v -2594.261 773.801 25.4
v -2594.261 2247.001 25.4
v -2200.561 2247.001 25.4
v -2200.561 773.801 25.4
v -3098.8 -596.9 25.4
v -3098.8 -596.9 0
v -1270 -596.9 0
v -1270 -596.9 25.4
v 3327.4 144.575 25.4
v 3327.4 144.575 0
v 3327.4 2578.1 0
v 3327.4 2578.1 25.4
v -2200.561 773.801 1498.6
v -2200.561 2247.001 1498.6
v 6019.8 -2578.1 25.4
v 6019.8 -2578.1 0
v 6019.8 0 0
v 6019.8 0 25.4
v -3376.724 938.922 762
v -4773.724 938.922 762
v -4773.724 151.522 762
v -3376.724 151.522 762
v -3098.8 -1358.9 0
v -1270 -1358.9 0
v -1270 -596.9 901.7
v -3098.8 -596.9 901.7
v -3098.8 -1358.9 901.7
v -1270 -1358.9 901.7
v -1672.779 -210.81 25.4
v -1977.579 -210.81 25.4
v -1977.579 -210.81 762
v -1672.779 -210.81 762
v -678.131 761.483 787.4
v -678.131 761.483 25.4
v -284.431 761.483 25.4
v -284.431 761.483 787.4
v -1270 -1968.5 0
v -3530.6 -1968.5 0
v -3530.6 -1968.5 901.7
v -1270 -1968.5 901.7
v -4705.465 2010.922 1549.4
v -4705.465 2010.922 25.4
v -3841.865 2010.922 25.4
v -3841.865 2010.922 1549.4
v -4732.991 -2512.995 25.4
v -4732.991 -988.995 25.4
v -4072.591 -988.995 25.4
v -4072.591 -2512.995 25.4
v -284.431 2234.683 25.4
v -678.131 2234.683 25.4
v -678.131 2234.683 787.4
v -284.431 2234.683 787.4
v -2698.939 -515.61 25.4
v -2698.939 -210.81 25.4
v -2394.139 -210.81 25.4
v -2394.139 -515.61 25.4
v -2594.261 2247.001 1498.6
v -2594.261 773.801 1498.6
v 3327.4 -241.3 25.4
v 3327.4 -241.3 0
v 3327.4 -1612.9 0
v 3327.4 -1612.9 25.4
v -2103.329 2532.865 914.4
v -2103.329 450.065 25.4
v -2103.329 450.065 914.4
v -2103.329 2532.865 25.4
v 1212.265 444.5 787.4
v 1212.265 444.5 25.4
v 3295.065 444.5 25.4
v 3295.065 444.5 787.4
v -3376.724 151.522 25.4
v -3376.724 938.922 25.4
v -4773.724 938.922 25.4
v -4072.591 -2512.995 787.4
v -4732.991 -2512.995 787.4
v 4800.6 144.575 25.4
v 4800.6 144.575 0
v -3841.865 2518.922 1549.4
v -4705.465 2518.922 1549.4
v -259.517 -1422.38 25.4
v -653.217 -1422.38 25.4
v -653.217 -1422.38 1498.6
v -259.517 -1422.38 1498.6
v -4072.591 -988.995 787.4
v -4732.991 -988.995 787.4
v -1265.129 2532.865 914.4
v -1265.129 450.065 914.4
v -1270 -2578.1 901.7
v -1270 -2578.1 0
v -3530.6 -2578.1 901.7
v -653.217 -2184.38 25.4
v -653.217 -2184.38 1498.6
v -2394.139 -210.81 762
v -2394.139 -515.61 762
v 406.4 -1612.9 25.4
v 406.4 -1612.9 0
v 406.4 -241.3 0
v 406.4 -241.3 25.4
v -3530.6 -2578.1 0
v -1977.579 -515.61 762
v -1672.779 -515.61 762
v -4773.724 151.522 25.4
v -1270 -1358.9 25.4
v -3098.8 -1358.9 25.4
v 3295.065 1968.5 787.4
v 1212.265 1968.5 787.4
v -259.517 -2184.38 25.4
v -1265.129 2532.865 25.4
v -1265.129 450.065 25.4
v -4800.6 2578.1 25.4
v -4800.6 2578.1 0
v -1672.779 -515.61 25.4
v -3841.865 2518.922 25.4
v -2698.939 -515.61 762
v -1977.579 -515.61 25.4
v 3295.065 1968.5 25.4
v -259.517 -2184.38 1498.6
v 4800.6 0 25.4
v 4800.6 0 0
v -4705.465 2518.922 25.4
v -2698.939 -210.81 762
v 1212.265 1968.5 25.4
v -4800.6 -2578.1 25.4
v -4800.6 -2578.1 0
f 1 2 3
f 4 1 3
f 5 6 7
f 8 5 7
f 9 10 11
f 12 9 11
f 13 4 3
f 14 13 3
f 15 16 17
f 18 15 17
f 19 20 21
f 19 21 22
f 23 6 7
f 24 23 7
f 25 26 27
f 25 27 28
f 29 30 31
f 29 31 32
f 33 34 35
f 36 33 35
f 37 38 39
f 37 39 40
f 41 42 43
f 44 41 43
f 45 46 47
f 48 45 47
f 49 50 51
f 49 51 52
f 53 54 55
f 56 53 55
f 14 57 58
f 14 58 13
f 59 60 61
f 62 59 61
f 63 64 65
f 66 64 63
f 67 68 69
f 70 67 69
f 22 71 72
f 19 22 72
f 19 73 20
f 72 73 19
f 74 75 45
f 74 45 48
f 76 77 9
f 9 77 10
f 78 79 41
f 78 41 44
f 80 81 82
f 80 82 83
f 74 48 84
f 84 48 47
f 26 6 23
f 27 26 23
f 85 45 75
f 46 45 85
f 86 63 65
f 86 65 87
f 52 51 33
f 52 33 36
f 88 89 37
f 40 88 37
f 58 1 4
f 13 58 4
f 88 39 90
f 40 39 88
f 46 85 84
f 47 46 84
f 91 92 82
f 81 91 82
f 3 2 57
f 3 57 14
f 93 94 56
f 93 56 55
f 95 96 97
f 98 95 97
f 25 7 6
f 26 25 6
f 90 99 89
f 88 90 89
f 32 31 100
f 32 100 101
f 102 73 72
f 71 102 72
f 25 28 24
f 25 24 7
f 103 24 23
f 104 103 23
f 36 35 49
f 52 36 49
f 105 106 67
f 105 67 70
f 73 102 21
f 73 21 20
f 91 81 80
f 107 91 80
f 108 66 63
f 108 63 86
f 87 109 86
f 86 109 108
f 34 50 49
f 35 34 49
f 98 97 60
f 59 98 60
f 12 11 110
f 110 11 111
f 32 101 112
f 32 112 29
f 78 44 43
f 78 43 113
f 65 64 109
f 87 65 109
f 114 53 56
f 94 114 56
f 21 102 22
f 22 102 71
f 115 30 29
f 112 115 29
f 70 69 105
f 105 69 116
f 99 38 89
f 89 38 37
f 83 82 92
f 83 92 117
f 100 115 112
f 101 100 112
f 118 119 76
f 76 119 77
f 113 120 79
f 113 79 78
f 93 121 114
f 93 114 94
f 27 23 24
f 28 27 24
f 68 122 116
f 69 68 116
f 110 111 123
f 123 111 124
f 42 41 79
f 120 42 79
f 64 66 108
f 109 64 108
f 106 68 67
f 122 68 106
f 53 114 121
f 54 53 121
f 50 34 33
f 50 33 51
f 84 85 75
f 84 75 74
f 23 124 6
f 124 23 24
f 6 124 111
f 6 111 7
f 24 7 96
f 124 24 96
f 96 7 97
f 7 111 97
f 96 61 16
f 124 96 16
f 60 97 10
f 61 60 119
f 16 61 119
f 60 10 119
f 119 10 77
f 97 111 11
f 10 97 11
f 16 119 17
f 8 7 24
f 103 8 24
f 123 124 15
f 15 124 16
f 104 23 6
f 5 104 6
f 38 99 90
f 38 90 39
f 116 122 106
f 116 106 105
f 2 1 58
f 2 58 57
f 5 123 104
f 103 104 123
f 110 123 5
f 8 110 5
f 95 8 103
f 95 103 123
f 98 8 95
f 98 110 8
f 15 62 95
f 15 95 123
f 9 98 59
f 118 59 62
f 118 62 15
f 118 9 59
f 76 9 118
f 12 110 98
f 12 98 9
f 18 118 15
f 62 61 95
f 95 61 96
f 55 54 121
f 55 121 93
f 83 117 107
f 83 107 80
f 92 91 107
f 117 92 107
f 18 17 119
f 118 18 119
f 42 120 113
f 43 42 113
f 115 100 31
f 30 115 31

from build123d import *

# Parameters (mm, degrees)
F2_DEPTH  = 901.7
F0_W      = 2260.6
F0_H      = 609.6
F0_W_2    = 609.6
F0_H_2    = 2438.4
F4_DEPTH  = 25.4
F7_W      = 838.2
F7_H      = 2082.8
F8_DEPTH  = 889
F9_W      = 393.7
F9_H      = 1473.2
F10_DEPTH = 762
F11_W     = 863.6
F11_H     = 508
F12_DEPTH = 1524
F13_W     = 1397
F13_H     = 787.4
F14_DEPTH = 736.6
F15_W     = 393.7
F15_H     = 762
F16_DEPTH = 1473.2
F17_W     = 393.7
F17_H     = 1473.2
F18_DEPTH = 1473.2
F19_W     = 304.8
F19_H     = 304.8
F20_DEPTH = 736.6
F21_W     = 660.4
F21_H     = 1524
F22_DEPTH = 762
F23_W     = 2082.8
F23_H     = 1524
F24_DEPTH = 762


# Not quite as in the source:
# - the program builds the solid bodies; features that only make, move or delete a surface that nothing else refers to are left out


with BuildPart() as f2:
    # F0 (on Top) → F2 (new body)
    with BuildSketch(Plane.XY):
        Polygon((-1270, -1358.9), (-1270, -952.5), (-1270, -596.9), (-3098.8, -596.9), (-3098.8, -1358.9), align=None)
    extrude(amount=F2_DEPTH)


with BuildPart() as f2b:
    # F0 (on Top) → F2, piece 2 (new body)
    with BuildSketch(Plane.XY):
        with Locations((-2400.3, -2273.3)):
            Rectangle(F0_W, F0_H)
    extrude(amount=F2_DEPTH)


with BuildPart() as f4:
    # F0 (on Top) → F4 (new body)
    with BuildSketch(Plane.XY):
        Polygon((-812.8, -2578.1), (4800.6, -2578.1), (4800.6, -1612.9), (3327.4, -1612.9), (406.4, -1612.9), (406.4, -241.3), (406.4, 139.7), (-203.2, 139.7), (-203.2, 2578.1), (-4800.6, 2578.1), (-4800.6, -2578.1), (-3530.6, -2578.1), (-3530.6, -1968.5), (-1270, -1968.5), (-1270, -1358.9), (-3098.8, -1358.9), (-3098.8, -596.9), (-1270, -596.9), (-1270, -952.5), (-812.8, -952.5), align=None)
        Polygon((4800.6, -1612.9), (4800.6, -2578.1), (6019.8, -2578.1), (6019.8, 0), (4800.6, 0), align=None)
        Polygon((-1270, -2578.1), (-812.8, -2578.1), (-812.8, -952.5), (-1270, -952.5), (-1270, -1358.9), (-1270, -1968.5), align=None)
        Polygon((3327.4, -1612.9), (4800.6, -1612.9), (4800.6, 0), (4800.6, 144.5753626943), (3327.4, 144.5753626943), (3327.4, -241.3), align=None)
        with Locations((-2400.3, -2273.3)):
            Rectangle(F0_W, F0_H)
        Polygon((406.4, -241.3), (3327.4, -241.3), (3327.4, 144.5753626943), (3327.4, 2578.1), (406.4, 2578.1), (406.4, 139.7), align=None)
        with Locations((101.6, 1358.9)):
            Rectangle(F0_W_2, F0_H_2)
    extrude(amount=F4_DEPTH)


with BuildPart() as f8:
    # F7 (on face) → F8 (new body)
    with BuildSketch(Plane.XY.offset(25.4)):
        with Locations((-1684.229016304, 1491.4646148682)):
            Rectangle(F7_W, F7_H)
    extrude(amount=F8_DEPTH)


with BuildPart() as f10:
    # F9 (on face) → F10 (new body)
    with BuildSketch(Plane.XY.offset(25.4)):
        with Locations((-481.2808632851, 1498.0827569962)):
            Rectangle(F9_W, F9_H)
    extrude(amount=F10_DEPTH)


with BuildPart() as f12:
    # F11 (on face) → F12 (new body)
    with BuildSketch(Plane.XY.offset(25.4)):
        with Locations((-4273.6654281616, 2264.9219036102)):
            Rectangle(F11_W, F11_H)
    extrude(amount=F12_DEPTH)


with BuildPart() as f14:
    # F13 (on face) → F14 (new body)
    with BuildSketch(Plane.XY.offset(25.4)):
        with Locations((-4075.2243995667, 545.2215075493)):
            Rectangle(F13_W, F13_H)
    extrude(amount=F14_DEPTH)


with BuildPart() as f16:
    # F15 (on face) → F16 (new body)
    with BuildSketch(Plane.XY.offset(25.4)):
        with Locations((-456.366866827, -1803.3801317215)):
            Rectangle(F15_W, F15_H)
    extrude(amount=F16_DEPTH)


with BuildPart() as f18:
    # F17 (on face) → F18 (new body)
    with BuildSketch(Plane.XY.offset(25.4)):
        with Locations((-2397.4113569062, 1510.4005336761)):
            Rectangle(F17_W, F17_H)
    extrude(amount=F18_DEPTH)


with BuildPart() as f20:
    # F19 (on face) → F20 (new body)
    with BuildSketch(Plane.XY.offset(25.4)):
        with Locations((-1825.1785008743, -363.2096648216)):
            Rectangle(F19_W, F19_H)
    extrude(amount=F20_DEPTH)


with BuildPart() as f20b:
    # F19 (on face) → F20, piece 2 (new body)
    with BuildSketch(Plane.XY.offset(25.4)):
        with Locations((-2546.5385913849, -363.2096648216)):
            Rectangle(F19_W, F19_H)
    extrude(amount=F20_DEPTH)


with BuildPart() as f22:
    # F21 (on face) → F22 (new body)
    with BuildSketch(Plane.XY.offset(25.4)):
        with Locations((-4402.7910232544, -1750.9953975677)):
            Rectangle(F21_W, F21_H)
    extrude(amount=F22_DEPTH)


with BuildPart() as f24:
    # F23 (on face) → F24 (new body)
    with BuildSketch(Plane.XY.offset(25.4)):
        with Locations((2253.6647319794, 1206.5)):
            Rectangle(F23_W, F23_H)
    extrude(amount=F24_DEPTH)


solid = Compound([f2.part, f2b.part, f4.part, f8.part, f10.part, f12.part, f14.part, f16.part, f18.part, f20.part, f20b.part, f22.part, f24.part])
